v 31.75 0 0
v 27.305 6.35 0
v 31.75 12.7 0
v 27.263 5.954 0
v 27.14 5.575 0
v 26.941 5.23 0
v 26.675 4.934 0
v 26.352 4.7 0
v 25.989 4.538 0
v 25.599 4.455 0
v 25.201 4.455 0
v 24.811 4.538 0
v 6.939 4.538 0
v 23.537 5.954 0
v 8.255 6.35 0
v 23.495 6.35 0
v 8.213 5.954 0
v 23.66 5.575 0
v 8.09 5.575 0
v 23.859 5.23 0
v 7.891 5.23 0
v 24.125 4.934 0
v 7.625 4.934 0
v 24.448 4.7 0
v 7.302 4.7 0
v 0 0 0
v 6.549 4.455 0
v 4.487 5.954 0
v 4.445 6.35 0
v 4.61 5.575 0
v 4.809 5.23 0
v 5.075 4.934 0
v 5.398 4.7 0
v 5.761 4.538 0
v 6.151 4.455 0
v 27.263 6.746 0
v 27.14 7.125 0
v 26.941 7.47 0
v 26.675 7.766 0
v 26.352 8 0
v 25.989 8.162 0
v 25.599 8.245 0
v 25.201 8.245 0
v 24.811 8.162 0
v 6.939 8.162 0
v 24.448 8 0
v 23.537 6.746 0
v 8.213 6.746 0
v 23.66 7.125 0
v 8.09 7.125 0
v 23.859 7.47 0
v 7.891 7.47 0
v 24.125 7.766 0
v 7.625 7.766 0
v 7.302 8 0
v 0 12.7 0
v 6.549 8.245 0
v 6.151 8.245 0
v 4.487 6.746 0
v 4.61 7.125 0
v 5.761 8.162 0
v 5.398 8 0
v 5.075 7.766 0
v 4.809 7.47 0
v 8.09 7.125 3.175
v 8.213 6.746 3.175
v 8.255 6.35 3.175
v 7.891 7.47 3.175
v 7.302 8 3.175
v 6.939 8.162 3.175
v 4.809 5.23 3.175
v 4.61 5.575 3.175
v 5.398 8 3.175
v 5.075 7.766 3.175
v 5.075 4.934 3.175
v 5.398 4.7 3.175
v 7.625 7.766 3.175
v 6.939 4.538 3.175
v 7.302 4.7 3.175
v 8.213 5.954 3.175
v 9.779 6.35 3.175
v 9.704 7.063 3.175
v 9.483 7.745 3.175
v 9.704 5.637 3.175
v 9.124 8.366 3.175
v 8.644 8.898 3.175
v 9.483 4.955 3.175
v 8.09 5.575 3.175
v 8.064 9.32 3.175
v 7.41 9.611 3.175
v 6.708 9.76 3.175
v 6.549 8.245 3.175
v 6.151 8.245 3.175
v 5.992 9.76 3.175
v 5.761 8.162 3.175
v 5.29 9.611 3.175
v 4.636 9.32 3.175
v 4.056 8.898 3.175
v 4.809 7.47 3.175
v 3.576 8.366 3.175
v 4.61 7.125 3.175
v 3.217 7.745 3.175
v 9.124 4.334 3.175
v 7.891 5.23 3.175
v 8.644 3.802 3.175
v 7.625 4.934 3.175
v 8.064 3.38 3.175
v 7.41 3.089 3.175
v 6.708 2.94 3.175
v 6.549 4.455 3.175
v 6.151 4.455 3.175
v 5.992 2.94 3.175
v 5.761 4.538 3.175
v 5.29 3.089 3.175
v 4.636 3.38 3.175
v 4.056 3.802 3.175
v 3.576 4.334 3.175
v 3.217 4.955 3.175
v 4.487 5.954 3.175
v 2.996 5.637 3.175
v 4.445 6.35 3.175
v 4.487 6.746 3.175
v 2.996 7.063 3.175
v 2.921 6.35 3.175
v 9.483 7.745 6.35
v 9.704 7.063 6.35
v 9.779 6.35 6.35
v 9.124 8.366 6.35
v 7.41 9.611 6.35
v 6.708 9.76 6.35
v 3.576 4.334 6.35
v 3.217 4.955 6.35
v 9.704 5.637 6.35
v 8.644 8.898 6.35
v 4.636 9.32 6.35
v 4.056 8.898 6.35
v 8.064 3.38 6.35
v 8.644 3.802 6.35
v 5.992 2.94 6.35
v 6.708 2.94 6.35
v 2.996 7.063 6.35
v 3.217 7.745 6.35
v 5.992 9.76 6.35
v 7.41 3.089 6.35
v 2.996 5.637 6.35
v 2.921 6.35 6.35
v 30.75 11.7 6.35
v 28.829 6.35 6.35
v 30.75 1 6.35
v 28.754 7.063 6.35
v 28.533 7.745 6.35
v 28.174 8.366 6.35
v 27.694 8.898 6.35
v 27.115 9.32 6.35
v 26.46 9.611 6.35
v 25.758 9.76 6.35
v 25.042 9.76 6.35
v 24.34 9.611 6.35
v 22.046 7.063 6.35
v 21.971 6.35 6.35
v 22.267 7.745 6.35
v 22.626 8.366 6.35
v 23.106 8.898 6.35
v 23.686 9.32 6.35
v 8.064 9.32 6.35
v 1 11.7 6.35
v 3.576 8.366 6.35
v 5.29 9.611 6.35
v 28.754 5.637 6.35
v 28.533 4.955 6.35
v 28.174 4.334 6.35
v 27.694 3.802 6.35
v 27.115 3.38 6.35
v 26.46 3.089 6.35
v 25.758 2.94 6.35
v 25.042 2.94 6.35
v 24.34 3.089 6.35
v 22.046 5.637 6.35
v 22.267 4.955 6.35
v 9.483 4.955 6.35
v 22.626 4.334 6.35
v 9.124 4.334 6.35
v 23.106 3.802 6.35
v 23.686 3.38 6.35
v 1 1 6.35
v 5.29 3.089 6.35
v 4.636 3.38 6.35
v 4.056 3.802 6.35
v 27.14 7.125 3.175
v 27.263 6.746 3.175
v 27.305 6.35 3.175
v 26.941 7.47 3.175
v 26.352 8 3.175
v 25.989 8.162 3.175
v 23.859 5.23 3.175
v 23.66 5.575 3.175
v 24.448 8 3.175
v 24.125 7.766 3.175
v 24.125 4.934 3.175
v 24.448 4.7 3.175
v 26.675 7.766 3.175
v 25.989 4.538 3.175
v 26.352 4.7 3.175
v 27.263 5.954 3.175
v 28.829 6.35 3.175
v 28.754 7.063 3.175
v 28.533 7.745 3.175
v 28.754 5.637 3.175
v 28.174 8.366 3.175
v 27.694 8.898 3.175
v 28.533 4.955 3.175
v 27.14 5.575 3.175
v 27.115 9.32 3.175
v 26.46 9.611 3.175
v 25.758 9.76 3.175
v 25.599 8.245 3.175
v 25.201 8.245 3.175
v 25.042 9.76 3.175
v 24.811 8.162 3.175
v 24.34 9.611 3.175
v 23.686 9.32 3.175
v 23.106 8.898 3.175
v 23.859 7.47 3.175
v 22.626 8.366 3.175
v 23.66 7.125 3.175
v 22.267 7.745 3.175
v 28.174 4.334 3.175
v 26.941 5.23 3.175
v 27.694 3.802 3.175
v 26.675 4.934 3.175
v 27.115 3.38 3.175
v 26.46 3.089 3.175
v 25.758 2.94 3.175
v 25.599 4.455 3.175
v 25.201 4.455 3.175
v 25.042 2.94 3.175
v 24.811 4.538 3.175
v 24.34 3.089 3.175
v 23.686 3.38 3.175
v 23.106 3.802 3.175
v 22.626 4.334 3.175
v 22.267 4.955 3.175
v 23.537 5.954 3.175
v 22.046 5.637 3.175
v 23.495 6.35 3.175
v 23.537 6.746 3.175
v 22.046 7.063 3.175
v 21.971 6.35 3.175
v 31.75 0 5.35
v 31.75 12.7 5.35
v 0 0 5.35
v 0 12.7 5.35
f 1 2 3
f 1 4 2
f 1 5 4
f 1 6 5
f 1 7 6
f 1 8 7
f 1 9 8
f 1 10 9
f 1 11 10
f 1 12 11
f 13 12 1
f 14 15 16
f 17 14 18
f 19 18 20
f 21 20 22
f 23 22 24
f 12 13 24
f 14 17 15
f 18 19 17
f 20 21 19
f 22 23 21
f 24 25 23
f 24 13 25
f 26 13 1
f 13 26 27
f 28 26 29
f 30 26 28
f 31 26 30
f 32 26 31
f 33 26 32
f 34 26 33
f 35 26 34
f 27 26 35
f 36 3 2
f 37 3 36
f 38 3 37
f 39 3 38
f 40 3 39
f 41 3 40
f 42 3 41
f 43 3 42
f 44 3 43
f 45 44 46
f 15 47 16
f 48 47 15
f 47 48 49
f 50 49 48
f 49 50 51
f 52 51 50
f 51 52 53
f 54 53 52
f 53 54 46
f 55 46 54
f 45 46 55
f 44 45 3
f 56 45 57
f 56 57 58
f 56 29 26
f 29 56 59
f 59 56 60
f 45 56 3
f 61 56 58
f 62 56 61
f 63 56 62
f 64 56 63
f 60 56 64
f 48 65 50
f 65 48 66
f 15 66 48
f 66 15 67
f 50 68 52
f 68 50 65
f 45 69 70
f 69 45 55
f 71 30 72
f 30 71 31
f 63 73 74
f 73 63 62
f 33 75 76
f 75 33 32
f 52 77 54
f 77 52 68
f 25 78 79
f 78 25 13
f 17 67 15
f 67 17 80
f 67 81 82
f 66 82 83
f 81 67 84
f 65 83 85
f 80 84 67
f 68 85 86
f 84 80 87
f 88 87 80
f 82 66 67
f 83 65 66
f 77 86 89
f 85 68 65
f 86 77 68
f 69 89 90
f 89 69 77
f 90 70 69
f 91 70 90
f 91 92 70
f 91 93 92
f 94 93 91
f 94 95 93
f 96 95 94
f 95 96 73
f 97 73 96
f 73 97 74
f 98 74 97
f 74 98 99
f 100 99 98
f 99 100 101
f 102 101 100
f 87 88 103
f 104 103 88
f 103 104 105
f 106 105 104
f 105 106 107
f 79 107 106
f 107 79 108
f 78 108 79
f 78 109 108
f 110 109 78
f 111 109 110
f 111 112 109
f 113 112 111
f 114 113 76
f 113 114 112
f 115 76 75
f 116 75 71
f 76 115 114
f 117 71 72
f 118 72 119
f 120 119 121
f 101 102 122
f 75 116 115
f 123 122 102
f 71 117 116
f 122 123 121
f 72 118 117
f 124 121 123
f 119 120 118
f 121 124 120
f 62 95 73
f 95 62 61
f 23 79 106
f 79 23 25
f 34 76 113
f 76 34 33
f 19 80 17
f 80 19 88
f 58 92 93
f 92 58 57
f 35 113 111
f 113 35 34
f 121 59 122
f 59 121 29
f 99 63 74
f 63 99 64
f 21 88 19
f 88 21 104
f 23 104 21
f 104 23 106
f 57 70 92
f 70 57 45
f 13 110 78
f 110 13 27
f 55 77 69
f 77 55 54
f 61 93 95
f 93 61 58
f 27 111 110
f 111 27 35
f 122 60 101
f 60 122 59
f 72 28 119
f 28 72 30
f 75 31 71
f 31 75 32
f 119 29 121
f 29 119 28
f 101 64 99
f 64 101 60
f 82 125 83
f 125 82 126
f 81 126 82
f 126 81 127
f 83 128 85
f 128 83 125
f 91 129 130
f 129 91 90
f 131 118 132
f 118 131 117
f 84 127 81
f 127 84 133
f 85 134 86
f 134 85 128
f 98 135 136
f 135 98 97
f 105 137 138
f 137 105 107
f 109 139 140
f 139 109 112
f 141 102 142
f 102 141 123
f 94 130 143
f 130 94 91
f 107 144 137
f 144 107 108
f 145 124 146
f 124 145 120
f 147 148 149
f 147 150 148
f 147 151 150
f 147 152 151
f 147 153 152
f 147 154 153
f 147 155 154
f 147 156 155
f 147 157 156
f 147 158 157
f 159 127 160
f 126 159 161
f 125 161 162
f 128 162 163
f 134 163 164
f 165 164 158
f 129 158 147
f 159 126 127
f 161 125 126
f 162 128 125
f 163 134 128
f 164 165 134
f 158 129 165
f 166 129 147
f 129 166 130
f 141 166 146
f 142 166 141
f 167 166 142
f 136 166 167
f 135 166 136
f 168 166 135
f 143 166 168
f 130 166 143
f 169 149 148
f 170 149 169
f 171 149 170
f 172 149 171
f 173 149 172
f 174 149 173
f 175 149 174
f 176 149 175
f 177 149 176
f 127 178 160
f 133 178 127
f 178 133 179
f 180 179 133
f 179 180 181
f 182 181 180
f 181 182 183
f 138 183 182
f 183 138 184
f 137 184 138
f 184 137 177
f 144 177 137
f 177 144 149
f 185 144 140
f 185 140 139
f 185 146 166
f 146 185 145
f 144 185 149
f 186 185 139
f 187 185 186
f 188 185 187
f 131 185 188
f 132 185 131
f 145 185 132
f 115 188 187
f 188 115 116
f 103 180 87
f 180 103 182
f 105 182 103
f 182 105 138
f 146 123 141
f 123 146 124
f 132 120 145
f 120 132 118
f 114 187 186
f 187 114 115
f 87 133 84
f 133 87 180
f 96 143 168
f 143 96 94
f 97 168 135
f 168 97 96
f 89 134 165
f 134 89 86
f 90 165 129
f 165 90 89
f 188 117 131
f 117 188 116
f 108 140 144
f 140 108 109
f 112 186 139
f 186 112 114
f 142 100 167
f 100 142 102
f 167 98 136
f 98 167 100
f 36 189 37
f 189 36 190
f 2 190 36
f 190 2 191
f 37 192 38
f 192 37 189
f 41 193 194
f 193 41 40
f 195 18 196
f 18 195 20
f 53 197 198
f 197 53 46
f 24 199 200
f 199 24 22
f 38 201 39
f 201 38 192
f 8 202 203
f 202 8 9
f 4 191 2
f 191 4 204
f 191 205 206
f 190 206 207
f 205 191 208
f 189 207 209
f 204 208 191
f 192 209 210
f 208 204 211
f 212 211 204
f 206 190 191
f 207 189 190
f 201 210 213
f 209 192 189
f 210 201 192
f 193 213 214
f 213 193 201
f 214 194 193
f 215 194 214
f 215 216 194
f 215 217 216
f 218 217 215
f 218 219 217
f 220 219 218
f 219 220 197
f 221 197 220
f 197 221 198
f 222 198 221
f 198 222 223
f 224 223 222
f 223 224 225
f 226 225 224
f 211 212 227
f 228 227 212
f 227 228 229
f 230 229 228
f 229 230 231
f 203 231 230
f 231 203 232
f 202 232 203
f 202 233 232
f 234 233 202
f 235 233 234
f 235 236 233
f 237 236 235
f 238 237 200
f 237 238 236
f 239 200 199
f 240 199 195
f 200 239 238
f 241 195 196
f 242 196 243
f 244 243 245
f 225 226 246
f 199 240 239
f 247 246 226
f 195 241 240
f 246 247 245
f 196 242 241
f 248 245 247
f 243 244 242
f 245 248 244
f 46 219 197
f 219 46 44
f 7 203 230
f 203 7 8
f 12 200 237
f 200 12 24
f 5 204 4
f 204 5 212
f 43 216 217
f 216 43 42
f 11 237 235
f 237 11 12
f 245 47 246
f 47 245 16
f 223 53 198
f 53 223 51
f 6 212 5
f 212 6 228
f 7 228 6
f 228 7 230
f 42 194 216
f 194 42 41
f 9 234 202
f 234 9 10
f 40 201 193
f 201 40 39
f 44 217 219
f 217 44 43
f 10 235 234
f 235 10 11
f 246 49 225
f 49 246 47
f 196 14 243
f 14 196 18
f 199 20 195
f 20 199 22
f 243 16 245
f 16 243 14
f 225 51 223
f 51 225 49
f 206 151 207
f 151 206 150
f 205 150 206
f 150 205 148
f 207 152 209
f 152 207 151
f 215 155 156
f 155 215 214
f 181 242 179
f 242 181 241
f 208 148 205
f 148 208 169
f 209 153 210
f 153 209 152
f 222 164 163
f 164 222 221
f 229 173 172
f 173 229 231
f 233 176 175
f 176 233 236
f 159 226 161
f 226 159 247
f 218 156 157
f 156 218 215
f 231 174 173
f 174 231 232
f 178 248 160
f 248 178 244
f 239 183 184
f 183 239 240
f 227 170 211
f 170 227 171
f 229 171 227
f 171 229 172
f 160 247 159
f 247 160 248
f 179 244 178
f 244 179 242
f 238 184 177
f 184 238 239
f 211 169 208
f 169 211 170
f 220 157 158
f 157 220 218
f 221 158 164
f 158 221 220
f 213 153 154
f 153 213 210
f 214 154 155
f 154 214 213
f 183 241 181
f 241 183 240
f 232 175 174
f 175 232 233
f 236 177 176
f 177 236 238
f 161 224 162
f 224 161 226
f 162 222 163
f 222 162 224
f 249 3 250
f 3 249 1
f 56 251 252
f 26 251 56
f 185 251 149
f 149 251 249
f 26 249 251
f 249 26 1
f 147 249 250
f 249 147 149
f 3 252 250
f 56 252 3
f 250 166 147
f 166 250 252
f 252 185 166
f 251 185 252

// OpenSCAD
// Customize invocations the invocations (which follow
// the modules declarations) at the bottom of the file.

// To get these to print the fine features created
// by the "text" command, I set "Outer wall" to
// 0.22mm.

inch = 25.4; // mm
eighth = inch / 8;
$fn=30;

screwbore = 0.15 * inch;
screwhead = .27 * inch;

// A stepped hole for a #6 screw.
module screwhole () {
    cylinder(d=screwbore, h=eighth);
    translate([0, 0, eighth])
        cylinder(d=screwhead, h=eighth);
}

// The basic foot without bevels.
module foot () {
    difference () {
        cube([1.25*inch, 0.5*inch, 0.25*inch]);
        // Two screw holes
        translate([0.25*inch, 0.25*inch, 0])
            screwhole();
        translate([1.0*inch, 0.25*inch, 0])
            screwhole();
        // Bevel some edges
        translate([1.25*inch, 0, 0.25*inch])
        rotate([180, 0, 180])
        bevel();
    }
}



// Compute a bevel
module bevel2 () {
         rotate ([90, 0, 90])
             linear_extrude (height=1.25*inch) 
                 polygon([[0, 0], [0, 1], [1, 0]]);
         rotate ([90, -90, 180])
             linear_extrude (height=0.5*inch) 
                 polygon([[0, 0], [0, 1], [1, 0]]);
}
module bevel() {
        bevel2();
        translate([1.25*inch, 0.5*inch, 0])
            rotate([0, 0, 180])
                bevel2();
}
//translate([1.25*inch, 0.5*inch, 0]) rotate([0, 0, 180]) bevel2();
//translate([1.25*inch, 0*inch, 0.25*inch]) rotate([180, 0, 180]) bevel();

// Change invocations below to generate dessired feet.
//screwhole();
foot();

//translate([0, 0*inch, 0]) foot();
//translate([0, 1*inch, 0]) foot();
//translate([0, 2*inch, 0]) foot();
